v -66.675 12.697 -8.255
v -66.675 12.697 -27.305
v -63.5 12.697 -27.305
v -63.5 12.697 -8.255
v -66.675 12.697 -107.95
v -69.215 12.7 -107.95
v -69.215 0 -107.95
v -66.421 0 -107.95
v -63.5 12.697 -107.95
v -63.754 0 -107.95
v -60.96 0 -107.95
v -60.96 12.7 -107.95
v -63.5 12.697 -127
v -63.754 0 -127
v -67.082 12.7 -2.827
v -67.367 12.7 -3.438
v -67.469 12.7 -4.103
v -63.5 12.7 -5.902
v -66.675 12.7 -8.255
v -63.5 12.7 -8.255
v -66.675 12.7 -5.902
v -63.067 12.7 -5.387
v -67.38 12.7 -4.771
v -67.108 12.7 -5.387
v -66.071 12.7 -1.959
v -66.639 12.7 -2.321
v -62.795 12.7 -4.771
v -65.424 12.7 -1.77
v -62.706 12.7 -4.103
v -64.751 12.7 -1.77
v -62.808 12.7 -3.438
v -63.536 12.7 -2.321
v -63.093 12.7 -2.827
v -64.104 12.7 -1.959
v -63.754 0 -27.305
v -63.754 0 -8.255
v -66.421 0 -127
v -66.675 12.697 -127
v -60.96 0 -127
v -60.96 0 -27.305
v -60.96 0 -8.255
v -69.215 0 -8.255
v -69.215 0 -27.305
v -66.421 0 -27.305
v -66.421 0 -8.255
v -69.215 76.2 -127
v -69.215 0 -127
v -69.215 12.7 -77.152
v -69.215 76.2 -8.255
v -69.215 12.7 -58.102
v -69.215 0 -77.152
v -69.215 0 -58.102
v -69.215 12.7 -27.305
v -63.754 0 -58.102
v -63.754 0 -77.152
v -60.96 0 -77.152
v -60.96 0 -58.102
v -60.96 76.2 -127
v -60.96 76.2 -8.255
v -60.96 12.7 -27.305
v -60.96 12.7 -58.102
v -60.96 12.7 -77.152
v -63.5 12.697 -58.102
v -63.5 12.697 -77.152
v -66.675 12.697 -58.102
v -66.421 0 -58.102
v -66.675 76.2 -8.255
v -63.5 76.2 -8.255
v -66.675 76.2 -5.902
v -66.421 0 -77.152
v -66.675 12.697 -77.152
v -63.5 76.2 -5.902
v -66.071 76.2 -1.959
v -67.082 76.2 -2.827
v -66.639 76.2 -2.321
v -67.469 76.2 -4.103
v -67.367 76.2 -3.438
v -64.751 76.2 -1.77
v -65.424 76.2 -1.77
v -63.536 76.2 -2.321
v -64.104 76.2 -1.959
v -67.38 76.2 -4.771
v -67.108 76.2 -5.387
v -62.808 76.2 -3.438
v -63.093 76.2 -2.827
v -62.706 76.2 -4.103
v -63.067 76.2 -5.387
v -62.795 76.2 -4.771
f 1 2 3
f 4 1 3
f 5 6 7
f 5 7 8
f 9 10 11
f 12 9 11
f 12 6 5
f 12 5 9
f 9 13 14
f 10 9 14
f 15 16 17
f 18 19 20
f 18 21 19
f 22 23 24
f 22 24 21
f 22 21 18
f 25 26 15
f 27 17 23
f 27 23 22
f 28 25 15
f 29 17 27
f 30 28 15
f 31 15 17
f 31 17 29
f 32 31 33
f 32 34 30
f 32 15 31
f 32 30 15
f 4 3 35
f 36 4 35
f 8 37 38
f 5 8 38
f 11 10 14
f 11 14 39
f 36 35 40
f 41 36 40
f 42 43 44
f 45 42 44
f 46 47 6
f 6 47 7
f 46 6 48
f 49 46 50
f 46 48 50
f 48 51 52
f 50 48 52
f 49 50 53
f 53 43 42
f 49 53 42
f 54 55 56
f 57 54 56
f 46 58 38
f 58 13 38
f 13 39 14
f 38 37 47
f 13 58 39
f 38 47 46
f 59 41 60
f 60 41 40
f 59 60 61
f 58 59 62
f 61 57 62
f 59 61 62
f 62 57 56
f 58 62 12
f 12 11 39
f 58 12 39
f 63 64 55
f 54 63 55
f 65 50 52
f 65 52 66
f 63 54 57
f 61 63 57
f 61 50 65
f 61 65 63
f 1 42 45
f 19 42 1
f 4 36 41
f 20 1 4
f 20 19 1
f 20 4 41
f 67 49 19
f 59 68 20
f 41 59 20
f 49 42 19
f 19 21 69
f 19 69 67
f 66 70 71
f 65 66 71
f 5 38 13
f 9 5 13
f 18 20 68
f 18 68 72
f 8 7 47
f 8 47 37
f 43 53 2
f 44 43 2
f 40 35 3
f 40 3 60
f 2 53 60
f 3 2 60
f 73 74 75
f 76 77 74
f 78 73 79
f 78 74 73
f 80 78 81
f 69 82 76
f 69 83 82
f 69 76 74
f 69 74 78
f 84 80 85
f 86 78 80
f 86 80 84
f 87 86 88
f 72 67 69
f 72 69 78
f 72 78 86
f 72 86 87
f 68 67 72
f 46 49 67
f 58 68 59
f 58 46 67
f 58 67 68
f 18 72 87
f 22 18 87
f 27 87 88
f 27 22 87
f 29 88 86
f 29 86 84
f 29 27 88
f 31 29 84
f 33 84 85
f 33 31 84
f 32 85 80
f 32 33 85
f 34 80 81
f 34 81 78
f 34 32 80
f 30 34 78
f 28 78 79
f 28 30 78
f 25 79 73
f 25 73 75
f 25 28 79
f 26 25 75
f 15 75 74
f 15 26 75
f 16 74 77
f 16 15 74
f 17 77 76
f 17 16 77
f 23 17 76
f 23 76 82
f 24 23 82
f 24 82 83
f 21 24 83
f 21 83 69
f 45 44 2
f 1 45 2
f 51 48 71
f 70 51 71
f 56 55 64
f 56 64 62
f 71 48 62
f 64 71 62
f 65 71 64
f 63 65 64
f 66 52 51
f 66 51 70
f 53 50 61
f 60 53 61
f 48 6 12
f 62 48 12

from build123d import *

# Parameters (mm, degrees)
BOSS_EXTRUDE1_DEPTH    = 76.2
CUT_EXTRUDE1_DEPTH     = 118.745
CUT_EXTRUDE2_START     = -12.7
CUT_EXTRUDE2_OUTLINE_W = 8.255
CUT_EXTRUDE2_OUTLINE_H = 30.7975
CUT_EXTRUDE2_DEPTH     = 12.7
SIDECUT_DEPTH          = 166.55395044


# Read off the part's stored shape, not the designer's step: Cut-Extrude2
with BuildPart() as part:
    # Sketch8 → Boss-Extrude1 (new body)
    with BuildSketch(Plane(origin=(0, 0, 0), x_dir=(1, 0, 0), z_dir=(0, 1, 0))):
        Polygon((-73.9775, 8.255), (-73.9775, 0), (73.9775, 0), (73.9775, 8.255), (69.215, 8.255), (69.215, 127), (60.96, 127), (60.96, 8.255), (-60.96, 8.255), (-60.96, 127), (-69.215, 127), (-69.215, 8.255), align=None)
    extrude(amount=BOSS_EXTRUDE1_DEPTH)

    # Sketch9 → Cut-Extrude1 (cut)
    with BuildSketch(Plane(origin=(0, 0, -127), x_dir=(-1, 0, 0), z_dir=(0, 0, -1))):
        Polygon((-66.421, 0), (-66.675, 12.697459746), (-63.5, 12.697459746), (-63.754, 0), align=None)
        Polygon((63.5, 12.697459746), (63.754, 0), (66.421, 0), (66.675, 12.697459746), align=None)
    extrude(amount=-CUT_EXTRUDE1_DEPTH, mode=Mode.SUBTRACT)

    # Cut-Extrude2 outline → Cut-Extrude2 (cut)
    with BuildSketch(Plane.XZ.offset(CUT_EXTRUDE2_START)):
        with Locations((65.0875, -42.70375)):
            Rectangle(CUT_EXTRUDE2_OUTLINE_W, CUT_EXTRUDE2_OUTLINE_H)
        with Locations((65.0875, -92.55125)):
            Rectangle(CUT_EXTRUDE2_OUTLINE_W, CUT_EXTRUDE2_OUTLINE_H)
        Polygon((62.9285, -8.255), (73.9775, -8.255), (73.9775, 0), (62.9285, 0), (62.9285, -2.54), (26.9875, -2.54), (26.9875, 0), (-26.9875, 0), (-26.9875, -2.54), (-62.9285, -2.54), (-62.9285, 0), (-73.9775, 0), (-73.9775, -8.255), (-62.9285, -8.255), (-62.9285, -5.715), (-26.9875, -5.715), (-26.9875, -8.255), (26.9875, -8.255), (26.9875, -5.715), (62.9285, -5.715), align=None)
        with Locations((-65.0875, -42.70375)):
            Rectangle(CUT_EXTRUDE2_OUTLINE_W, CUT_EXTRUDE2_OUTLINE_H)
        with Locations((-65.0875, -92.55125)):
            Rectangle(CUT_EXTRUDE2_OUTLINE_W, CUT_EXTRUDE2_OUTLINE_H)
    extrude(amount=CUT_EXTRUDE2_DEPTH, mode=Mode.SUBTRACT)

    # Sketch8<6> → SideCut (cut, through all)
    with BuildSketch(Plane(origin=(0, 0, 0), x_dir=(1, 0, 0), z_dir=(0, 1, 0))):
        with BuildLine():
            Line((-73.9775, 8.255), (-73.9775, 0))
            Line((-73.9775, 0), (73.9775, 0))
            Line((73.9775, 0), (73.9775, 8.255))
            Line((73.9775, 8.255), (69.215, 8.255))
            Line((69.215, 8.255), (69.215, 127))
            Line((69.215, 127), (60.96, 127))
            Line((60.96, 127), (60.96, 8.255))
            Line((60.96, 8.255), (-63.5, 8.255))
            Line((-63.5, 8.255), (-63.5, 5.902378957))
            ThreePointArc((-63.5, 5.902378957), (-65.0875, 1.74625), (-66.675, 5.902378957))
            Line((-66.675, 5.902378957), (-66.675, 8.255))
            Line((-66.675, 8.255), (-73.9775, 8.255))
        make_face()
    extrude(amount=SIDECUT_DEPTH, mode=Mode.SUBTRACT)


solid = part.part
